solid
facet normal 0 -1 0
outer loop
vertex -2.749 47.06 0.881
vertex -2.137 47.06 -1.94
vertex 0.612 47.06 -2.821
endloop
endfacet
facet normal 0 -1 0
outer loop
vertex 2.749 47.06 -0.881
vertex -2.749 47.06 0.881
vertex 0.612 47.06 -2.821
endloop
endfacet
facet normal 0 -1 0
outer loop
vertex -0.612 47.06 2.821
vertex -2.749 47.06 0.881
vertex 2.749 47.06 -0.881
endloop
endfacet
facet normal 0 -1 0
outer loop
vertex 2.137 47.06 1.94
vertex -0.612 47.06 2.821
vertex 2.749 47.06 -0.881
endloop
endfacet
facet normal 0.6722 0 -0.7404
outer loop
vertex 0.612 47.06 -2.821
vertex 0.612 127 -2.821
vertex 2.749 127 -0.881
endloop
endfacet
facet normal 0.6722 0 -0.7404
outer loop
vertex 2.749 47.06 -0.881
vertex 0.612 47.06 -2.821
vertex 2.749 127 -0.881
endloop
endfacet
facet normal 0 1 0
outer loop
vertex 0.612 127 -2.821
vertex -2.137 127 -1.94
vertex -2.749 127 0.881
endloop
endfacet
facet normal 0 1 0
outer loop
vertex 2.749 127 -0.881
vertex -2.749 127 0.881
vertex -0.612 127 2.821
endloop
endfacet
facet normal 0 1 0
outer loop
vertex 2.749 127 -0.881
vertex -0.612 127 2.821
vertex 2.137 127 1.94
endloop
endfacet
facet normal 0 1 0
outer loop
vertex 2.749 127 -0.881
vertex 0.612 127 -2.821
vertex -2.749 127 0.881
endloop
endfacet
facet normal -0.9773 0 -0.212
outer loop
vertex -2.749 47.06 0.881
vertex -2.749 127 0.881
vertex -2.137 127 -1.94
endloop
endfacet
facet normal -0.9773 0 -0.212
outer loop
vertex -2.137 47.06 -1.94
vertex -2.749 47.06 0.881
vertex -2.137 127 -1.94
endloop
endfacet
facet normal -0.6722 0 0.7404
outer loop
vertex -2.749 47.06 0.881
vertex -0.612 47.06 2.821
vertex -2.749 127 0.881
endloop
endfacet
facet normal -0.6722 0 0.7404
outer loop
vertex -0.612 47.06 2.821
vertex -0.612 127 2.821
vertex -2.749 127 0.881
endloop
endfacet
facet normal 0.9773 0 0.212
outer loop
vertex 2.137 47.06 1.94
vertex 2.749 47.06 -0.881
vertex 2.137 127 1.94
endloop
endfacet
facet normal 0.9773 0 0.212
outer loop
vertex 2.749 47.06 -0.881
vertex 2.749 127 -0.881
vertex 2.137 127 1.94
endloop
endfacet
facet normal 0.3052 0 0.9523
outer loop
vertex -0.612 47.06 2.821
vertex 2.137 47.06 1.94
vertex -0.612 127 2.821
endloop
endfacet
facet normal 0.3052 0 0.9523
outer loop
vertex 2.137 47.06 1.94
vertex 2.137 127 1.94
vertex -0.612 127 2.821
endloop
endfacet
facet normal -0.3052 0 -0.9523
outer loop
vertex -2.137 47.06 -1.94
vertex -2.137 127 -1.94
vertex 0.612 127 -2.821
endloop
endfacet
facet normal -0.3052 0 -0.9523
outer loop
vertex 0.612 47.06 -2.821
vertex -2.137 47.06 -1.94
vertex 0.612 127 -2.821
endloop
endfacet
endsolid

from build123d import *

# Parameters (mm, degrees)
BOSS_EXTRUDE1_DEPTH = 127
SKETCH3_W           = 20.194547067
SKETCH3_H           = 18.170773651
CUT_EXTRUDE1_DEPTH  = 38.1
BOSS_EXTRUDE2_DEPTH = 2.54
SKETCH5_W           = 34.517572909
SKETCH5_H           = 22.340458643
CUT_EXTRUDE2_DEPTH  = 50
BOSS_EXTRUDE3_DEPTH = 25
BOSS_EXTRUDE4_DEPTH = 13.5


with BuildPart() as part:
    # Sketch2 → Boss-Extrude1 (new body)
    with BuildSketch(Plane(origin=(0, 0, 0), x_dir=(1, 0, 0), z_dir=(0, 1, 0))):
        Polygon((2.137295047, -1.940438924), (2.749116926, 0.880732344), (0.611821879, 2.821171268), (-2.137295047, 1.940438924), (-2.749116926, -0.880732344), (-0.611821879, -2.821171268), align=None)
    extrude(amount=BOSS_EXTRUDE1_DEPTH)

    # Sketch3 → Cut-Extrude1 (cut)
    with BuildSketch(Plane.XZ):
        with Locations((-3.121926418, 0.771419978)):
            Rectangle(SKETCH3_W, SKETCH3_H)
    extrude(amount=-CUT_EXTRUDE1_DEPTH, mode=Mode.SUBTRACT)

    # Sketch4 → Boss-Extrude2 (add)
    with BuildSketch(Plane.XZ.offset(-38.1)):
        Polygon((0.611821879, -2.821171268), (2.749116926, -0.880732344), (2.137295047, 1.940438924), (-0.611821879, 2.821171268), (-2.749116926, 0.880732344), (-2.137295047, -1.940438924), align=None)
    extrude(amount=BOSS_EXTRUDE2_DEPTH)

    # Sketch5 → Cut-Extrude2 (cut)
    with BuildSketch(Plane.XZ.offset(-35.56)):
        with Locations((-1.3482575, -1.032578251)):
            Rectangle(SKETCH5_W, SKETCH5_H)
    extrude(amount=-CUT_EXTRUDE2_DEPTH, mode=Mode.SUBTRACT)

    # Sketch7 → Boss-Extrude3 (add)
    with BuildSketch(Plane.XZ.offset(-85.56)):
        Polygon((0.611821879, -2.821171268), (2.749116926, -0.880732344), (2.137295047, 1.940438924), (-0.611821879, 2.821171268), (-2.749116926, 0.880732344), (-2.137295047, -1.940438924), align=None)
    extrude(amount=BOSS_EXTRUDE3_DEPTH)

    # Sketch8 → Boss-Extrude4 (add)
    with BuildSketch(Plane.XZ.offset(-60.56)):
        Polygon((0.611821879, -2.821171268), (2.749116926, -0.880732344), (2.137295047, 1.940438924), (-0.611821879, 2.821171268), (-2.749116926, 0.880732344), (-2.137295047, -1.940438924), align=None)
    extrude(amount=BOSS_EXTRUDE4_DEPTH)


solid = part.part
